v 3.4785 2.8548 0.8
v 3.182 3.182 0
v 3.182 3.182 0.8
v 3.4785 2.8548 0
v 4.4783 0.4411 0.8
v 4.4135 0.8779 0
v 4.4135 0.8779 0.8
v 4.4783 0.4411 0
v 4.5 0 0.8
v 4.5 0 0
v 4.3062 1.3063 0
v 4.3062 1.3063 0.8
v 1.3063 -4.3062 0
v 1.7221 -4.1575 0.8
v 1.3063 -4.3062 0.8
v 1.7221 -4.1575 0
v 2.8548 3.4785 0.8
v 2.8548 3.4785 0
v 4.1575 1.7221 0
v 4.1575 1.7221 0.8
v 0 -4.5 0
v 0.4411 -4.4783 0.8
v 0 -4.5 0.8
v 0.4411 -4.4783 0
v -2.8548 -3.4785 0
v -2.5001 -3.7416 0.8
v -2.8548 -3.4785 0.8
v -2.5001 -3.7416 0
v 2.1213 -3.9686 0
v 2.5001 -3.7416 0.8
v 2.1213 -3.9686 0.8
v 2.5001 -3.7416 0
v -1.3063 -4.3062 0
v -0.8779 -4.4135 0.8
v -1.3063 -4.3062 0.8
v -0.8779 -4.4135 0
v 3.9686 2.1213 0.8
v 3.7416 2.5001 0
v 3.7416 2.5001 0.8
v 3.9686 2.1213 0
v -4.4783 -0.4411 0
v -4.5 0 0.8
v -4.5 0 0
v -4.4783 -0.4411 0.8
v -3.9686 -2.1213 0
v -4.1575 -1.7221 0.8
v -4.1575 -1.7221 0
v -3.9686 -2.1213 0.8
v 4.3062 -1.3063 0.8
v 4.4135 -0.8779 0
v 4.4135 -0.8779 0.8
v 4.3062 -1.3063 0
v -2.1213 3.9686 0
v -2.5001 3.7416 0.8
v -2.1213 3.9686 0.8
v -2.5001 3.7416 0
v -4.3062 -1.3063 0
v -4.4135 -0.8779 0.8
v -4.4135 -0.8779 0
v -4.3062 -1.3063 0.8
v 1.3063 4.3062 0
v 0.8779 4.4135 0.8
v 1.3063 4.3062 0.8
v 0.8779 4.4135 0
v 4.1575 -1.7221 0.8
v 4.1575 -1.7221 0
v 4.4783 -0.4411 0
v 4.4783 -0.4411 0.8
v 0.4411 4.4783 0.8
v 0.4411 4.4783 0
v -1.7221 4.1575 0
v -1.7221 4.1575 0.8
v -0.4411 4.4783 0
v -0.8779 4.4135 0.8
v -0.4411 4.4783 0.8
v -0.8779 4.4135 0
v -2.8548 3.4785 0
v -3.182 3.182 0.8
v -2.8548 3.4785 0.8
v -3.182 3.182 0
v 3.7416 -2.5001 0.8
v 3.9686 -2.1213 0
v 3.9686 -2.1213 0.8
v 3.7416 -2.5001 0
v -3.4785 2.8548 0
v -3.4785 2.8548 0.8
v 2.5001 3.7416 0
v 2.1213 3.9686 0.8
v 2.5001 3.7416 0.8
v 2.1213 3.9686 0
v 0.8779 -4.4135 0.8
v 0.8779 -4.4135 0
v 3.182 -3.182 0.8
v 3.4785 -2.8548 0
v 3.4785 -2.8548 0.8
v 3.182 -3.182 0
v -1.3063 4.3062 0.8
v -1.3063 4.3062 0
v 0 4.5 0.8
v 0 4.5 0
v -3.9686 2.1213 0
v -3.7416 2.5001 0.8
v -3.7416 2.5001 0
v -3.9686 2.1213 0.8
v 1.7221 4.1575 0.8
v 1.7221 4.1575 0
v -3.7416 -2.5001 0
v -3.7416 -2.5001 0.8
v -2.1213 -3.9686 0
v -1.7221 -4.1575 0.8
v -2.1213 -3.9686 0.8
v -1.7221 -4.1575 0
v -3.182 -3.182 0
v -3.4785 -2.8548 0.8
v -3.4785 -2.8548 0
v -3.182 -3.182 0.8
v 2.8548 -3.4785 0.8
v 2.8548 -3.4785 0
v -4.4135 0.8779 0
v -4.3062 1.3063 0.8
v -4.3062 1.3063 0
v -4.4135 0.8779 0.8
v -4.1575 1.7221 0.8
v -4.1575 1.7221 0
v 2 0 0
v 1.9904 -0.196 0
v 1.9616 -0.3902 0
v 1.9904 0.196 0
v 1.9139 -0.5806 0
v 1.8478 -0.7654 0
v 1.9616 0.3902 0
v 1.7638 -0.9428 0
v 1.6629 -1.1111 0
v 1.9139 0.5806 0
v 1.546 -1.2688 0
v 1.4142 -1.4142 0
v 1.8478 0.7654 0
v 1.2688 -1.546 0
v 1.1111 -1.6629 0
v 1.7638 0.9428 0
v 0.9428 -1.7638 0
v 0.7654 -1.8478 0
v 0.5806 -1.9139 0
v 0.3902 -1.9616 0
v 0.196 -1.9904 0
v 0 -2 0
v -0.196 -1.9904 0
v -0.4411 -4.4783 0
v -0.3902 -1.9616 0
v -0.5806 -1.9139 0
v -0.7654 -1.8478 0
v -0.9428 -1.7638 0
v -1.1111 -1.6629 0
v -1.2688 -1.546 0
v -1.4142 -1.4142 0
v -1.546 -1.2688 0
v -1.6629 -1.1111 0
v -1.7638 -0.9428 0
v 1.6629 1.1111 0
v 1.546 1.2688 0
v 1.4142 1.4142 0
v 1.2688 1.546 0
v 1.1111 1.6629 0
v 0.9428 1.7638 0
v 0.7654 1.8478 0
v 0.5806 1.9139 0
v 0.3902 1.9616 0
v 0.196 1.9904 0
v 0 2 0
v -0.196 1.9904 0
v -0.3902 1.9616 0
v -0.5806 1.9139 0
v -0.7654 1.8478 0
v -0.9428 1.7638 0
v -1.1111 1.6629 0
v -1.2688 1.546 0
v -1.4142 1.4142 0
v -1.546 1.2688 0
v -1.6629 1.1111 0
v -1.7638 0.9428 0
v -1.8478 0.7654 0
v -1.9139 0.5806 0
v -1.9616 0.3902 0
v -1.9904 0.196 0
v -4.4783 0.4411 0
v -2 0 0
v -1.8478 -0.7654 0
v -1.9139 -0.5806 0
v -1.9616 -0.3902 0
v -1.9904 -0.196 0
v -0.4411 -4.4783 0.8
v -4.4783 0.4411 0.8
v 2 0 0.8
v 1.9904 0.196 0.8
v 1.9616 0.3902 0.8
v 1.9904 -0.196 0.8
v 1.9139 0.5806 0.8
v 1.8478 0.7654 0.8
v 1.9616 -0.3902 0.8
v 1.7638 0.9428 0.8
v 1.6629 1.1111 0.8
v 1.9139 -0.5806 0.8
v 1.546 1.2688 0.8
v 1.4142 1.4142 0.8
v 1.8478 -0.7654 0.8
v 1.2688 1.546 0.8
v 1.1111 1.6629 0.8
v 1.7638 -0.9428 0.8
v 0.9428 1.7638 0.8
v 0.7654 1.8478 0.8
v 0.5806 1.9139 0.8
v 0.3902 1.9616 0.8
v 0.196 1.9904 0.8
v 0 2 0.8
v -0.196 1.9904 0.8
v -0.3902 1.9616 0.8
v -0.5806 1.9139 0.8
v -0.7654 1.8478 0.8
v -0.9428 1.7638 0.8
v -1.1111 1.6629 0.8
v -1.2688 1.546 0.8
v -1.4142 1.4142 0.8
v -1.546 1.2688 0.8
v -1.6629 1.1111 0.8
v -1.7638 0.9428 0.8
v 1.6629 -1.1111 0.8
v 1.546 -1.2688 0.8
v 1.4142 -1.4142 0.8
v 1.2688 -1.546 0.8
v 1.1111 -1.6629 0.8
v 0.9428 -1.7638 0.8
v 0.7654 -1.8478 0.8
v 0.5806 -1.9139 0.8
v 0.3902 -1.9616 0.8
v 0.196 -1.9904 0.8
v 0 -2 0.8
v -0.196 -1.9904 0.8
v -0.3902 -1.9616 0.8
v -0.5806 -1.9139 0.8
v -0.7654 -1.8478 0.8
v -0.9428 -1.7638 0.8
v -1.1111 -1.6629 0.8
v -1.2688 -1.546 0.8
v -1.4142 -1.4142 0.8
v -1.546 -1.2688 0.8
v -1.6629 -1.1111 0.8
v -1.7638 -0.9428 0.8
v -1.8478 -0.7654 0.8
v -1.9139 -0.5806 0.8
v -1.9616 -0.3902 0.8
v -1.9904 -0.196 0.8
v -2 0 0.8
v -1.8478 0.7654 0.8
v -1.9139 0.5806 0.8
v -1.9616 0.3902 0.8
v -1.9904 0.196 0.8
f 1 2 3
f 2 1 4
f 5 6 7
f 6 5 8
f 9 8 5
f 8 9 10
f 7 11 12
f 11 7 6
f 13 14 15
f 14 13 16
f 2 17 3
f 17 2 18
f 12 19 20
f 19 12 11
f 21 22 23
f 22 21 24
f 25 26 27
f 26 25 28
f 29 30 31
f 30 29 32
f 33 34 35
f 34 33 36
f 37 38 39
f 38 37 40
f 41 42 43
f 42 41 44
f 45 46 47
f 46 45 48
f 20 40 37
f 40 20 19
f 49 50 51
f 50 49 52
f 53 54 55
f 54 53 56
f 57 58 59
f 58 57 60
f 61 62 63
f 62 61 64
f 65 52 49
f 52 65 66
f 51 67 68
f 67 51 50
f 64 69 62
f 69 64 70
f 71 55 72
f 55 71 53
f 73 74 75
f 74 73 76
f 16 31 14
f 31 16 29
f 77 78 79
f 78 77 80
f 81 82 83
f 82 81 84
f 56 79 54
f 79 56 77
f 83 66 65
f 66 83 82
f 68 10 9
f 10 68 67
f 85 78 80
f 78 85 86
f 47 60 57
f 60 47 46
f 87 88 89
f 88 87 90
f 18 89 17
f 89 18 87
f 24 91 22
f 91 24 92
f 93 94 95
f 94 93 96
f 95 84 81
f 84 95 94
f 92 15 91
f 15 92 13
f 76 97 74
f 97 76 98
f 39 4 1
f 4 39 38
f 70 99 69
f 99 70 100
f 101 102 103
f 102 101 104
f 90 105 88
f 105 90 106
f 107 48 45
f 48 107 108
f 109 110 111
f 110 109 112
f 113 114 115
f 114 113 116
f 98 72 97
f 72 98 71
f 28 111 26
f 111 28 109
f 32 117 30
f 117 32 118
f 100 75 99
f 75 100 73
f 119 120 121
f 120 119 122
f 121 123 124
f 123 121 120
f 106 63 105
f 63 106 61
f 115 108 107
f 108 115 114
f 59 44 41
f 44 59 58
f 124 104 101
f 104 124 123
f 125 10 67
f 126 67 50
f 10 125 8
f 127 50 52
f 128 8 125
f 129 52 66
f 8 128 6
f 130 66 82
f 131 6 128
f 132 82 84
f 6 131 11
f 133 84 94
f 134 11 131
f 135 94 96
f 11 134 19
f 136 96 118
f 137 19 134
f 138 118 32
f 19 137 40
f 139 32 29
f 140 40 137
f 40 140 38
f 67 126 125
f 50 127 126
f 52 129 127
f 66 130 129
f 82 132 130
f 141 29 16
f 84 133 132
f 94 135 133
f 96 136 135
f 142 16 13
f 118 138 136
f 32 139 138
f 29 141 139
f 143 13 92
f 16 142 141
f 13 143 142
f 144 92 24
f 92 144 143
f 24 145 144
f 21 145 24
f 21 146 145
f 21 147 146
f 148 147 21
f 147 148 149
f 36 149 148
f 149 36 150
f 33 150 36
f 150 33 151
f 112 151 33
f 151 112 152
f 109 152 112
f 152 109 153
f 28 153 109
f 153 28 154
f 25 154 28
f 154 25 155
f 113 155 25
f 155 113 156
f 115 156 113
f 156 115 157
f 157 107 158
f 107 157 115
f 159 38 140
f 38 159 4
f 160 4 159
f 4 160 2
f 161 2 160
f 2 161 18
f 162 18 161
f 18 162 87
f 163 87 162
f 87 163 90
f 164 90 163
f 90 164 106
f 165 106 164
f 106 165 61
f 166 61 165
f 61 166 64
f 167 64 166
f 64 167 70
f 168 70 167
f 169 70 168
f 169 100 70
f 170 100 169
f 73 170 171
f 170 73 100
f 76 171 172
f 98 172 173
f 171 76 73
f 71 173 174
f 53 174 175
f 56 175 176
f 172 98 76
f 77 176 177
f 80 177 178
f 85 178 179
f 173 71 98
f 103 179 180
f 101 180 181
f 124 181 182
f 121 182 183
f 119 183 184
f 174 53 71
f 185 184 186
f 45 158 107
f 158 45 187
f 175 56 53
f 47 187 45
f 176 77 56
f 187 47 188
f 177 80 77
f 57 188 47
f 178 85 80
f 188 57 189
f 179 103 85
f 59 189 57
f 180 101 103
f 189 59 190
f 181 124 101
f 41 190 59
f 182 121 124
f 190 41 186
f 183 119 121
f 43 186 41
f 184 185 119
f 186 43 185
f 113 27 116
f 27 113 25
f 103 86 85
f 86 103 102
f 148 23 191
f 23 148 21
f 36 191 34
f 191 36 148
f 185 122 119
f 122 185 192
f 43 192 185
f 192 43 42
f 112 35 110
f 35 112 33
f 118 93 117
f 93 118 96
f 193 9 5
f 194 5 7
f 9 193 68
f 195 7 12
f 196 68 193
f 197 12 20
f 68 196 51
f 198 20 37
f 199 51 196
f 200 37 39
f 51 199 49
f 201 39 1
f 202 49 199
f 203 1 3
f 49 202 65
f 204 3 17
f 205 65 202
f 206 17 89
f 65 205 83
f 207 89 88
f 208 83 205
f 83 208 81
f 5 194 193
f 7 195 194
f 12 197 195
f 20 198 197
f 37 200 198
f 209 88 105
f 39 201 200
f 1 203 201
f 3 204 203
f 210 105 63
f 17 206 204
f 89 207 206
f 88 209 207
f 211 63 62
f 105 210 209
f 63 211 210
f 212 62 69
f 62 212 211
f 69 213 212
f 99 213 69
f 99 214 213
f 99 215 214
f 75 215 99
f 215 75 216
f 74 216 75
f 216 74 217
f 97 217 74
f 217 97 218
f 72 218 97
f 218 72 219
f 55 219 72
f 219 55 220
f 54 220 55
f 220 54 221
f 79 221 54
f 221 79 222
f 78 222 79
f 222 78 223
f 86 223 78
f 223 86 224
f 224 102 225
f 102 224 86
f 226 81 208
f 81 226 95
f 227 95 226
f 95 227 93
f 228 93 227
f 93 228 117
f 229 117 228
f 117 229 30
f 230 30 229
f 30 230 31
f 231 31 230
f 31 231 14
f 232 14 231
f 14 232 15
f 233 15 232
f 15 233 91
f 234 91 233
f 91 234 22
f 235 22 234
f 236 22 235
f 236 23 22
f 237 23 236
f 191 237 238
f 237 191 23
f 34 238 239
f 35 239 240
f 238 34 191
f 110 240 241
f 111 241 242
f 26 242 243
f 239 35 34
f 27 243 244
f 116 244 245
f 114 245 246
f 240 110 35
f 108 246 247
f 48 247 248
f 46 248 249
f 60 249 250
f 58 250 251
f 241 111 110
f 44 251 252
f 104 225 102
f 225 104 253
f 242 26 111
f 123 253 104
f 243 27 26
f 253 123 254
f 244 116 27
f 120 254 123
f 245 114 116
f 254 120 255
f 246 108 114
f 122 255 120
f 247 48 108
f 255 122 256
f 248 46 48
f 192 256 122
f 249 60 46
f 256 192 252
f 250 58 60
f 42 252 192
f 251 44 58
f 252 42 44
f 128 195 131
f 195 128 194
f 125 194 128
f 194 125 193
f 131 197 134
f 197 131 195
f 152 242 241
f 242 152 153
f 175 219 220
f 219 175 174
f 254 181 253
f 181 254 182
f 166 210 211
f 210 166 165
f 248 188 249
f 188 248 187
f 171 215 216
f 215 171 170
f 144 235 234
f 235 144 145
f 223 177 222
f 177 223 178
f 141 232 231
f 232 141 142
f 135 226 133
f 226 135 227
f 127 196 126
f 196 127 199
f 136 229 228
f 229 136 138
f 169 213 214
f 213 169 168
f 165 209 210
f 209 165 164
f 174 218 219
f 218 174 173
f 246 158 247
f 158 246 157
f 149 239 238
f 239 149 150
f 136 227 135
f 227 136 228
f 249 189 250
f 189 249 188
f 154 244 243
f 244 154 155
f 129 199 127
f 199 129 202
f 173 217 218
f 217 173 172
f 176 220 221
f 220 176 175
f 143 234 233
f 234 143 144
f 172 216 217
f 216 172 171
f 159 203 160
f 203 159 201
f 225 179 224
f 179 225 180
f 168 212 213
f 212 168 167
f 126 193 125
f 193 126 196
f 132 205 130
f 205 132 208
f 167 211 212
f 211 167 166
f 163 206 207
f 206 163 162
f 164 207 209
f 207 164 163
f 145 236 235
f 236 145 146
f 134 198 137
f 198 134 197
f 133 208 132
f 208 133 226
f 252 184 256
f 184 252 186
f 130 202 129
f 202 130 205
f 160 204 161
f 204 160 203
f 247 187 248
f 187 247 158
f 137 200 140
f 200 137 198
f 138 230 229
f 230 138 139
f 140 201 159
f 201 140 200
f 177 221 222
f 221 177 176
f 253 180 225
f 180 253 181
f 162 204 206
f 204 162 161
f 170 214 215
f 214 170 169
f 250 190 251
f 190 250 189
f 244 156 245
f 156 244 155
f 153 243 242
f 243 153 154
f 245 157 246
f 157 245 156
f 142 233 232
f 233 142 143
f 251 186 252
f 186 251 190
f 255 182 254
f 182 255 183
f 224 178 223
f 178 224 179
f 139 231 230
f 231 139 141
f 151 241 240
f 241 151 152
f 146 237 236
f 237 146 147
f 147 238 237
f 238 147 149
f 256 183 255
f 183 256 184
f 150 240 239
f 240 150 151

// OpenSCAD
difference() {
    cylinder(h=0.8, d=9.0, $fn=64);
    translate([0, 0, -0.1])
        cylinder(h=1.0, d=4.0, $fn=64);
}
